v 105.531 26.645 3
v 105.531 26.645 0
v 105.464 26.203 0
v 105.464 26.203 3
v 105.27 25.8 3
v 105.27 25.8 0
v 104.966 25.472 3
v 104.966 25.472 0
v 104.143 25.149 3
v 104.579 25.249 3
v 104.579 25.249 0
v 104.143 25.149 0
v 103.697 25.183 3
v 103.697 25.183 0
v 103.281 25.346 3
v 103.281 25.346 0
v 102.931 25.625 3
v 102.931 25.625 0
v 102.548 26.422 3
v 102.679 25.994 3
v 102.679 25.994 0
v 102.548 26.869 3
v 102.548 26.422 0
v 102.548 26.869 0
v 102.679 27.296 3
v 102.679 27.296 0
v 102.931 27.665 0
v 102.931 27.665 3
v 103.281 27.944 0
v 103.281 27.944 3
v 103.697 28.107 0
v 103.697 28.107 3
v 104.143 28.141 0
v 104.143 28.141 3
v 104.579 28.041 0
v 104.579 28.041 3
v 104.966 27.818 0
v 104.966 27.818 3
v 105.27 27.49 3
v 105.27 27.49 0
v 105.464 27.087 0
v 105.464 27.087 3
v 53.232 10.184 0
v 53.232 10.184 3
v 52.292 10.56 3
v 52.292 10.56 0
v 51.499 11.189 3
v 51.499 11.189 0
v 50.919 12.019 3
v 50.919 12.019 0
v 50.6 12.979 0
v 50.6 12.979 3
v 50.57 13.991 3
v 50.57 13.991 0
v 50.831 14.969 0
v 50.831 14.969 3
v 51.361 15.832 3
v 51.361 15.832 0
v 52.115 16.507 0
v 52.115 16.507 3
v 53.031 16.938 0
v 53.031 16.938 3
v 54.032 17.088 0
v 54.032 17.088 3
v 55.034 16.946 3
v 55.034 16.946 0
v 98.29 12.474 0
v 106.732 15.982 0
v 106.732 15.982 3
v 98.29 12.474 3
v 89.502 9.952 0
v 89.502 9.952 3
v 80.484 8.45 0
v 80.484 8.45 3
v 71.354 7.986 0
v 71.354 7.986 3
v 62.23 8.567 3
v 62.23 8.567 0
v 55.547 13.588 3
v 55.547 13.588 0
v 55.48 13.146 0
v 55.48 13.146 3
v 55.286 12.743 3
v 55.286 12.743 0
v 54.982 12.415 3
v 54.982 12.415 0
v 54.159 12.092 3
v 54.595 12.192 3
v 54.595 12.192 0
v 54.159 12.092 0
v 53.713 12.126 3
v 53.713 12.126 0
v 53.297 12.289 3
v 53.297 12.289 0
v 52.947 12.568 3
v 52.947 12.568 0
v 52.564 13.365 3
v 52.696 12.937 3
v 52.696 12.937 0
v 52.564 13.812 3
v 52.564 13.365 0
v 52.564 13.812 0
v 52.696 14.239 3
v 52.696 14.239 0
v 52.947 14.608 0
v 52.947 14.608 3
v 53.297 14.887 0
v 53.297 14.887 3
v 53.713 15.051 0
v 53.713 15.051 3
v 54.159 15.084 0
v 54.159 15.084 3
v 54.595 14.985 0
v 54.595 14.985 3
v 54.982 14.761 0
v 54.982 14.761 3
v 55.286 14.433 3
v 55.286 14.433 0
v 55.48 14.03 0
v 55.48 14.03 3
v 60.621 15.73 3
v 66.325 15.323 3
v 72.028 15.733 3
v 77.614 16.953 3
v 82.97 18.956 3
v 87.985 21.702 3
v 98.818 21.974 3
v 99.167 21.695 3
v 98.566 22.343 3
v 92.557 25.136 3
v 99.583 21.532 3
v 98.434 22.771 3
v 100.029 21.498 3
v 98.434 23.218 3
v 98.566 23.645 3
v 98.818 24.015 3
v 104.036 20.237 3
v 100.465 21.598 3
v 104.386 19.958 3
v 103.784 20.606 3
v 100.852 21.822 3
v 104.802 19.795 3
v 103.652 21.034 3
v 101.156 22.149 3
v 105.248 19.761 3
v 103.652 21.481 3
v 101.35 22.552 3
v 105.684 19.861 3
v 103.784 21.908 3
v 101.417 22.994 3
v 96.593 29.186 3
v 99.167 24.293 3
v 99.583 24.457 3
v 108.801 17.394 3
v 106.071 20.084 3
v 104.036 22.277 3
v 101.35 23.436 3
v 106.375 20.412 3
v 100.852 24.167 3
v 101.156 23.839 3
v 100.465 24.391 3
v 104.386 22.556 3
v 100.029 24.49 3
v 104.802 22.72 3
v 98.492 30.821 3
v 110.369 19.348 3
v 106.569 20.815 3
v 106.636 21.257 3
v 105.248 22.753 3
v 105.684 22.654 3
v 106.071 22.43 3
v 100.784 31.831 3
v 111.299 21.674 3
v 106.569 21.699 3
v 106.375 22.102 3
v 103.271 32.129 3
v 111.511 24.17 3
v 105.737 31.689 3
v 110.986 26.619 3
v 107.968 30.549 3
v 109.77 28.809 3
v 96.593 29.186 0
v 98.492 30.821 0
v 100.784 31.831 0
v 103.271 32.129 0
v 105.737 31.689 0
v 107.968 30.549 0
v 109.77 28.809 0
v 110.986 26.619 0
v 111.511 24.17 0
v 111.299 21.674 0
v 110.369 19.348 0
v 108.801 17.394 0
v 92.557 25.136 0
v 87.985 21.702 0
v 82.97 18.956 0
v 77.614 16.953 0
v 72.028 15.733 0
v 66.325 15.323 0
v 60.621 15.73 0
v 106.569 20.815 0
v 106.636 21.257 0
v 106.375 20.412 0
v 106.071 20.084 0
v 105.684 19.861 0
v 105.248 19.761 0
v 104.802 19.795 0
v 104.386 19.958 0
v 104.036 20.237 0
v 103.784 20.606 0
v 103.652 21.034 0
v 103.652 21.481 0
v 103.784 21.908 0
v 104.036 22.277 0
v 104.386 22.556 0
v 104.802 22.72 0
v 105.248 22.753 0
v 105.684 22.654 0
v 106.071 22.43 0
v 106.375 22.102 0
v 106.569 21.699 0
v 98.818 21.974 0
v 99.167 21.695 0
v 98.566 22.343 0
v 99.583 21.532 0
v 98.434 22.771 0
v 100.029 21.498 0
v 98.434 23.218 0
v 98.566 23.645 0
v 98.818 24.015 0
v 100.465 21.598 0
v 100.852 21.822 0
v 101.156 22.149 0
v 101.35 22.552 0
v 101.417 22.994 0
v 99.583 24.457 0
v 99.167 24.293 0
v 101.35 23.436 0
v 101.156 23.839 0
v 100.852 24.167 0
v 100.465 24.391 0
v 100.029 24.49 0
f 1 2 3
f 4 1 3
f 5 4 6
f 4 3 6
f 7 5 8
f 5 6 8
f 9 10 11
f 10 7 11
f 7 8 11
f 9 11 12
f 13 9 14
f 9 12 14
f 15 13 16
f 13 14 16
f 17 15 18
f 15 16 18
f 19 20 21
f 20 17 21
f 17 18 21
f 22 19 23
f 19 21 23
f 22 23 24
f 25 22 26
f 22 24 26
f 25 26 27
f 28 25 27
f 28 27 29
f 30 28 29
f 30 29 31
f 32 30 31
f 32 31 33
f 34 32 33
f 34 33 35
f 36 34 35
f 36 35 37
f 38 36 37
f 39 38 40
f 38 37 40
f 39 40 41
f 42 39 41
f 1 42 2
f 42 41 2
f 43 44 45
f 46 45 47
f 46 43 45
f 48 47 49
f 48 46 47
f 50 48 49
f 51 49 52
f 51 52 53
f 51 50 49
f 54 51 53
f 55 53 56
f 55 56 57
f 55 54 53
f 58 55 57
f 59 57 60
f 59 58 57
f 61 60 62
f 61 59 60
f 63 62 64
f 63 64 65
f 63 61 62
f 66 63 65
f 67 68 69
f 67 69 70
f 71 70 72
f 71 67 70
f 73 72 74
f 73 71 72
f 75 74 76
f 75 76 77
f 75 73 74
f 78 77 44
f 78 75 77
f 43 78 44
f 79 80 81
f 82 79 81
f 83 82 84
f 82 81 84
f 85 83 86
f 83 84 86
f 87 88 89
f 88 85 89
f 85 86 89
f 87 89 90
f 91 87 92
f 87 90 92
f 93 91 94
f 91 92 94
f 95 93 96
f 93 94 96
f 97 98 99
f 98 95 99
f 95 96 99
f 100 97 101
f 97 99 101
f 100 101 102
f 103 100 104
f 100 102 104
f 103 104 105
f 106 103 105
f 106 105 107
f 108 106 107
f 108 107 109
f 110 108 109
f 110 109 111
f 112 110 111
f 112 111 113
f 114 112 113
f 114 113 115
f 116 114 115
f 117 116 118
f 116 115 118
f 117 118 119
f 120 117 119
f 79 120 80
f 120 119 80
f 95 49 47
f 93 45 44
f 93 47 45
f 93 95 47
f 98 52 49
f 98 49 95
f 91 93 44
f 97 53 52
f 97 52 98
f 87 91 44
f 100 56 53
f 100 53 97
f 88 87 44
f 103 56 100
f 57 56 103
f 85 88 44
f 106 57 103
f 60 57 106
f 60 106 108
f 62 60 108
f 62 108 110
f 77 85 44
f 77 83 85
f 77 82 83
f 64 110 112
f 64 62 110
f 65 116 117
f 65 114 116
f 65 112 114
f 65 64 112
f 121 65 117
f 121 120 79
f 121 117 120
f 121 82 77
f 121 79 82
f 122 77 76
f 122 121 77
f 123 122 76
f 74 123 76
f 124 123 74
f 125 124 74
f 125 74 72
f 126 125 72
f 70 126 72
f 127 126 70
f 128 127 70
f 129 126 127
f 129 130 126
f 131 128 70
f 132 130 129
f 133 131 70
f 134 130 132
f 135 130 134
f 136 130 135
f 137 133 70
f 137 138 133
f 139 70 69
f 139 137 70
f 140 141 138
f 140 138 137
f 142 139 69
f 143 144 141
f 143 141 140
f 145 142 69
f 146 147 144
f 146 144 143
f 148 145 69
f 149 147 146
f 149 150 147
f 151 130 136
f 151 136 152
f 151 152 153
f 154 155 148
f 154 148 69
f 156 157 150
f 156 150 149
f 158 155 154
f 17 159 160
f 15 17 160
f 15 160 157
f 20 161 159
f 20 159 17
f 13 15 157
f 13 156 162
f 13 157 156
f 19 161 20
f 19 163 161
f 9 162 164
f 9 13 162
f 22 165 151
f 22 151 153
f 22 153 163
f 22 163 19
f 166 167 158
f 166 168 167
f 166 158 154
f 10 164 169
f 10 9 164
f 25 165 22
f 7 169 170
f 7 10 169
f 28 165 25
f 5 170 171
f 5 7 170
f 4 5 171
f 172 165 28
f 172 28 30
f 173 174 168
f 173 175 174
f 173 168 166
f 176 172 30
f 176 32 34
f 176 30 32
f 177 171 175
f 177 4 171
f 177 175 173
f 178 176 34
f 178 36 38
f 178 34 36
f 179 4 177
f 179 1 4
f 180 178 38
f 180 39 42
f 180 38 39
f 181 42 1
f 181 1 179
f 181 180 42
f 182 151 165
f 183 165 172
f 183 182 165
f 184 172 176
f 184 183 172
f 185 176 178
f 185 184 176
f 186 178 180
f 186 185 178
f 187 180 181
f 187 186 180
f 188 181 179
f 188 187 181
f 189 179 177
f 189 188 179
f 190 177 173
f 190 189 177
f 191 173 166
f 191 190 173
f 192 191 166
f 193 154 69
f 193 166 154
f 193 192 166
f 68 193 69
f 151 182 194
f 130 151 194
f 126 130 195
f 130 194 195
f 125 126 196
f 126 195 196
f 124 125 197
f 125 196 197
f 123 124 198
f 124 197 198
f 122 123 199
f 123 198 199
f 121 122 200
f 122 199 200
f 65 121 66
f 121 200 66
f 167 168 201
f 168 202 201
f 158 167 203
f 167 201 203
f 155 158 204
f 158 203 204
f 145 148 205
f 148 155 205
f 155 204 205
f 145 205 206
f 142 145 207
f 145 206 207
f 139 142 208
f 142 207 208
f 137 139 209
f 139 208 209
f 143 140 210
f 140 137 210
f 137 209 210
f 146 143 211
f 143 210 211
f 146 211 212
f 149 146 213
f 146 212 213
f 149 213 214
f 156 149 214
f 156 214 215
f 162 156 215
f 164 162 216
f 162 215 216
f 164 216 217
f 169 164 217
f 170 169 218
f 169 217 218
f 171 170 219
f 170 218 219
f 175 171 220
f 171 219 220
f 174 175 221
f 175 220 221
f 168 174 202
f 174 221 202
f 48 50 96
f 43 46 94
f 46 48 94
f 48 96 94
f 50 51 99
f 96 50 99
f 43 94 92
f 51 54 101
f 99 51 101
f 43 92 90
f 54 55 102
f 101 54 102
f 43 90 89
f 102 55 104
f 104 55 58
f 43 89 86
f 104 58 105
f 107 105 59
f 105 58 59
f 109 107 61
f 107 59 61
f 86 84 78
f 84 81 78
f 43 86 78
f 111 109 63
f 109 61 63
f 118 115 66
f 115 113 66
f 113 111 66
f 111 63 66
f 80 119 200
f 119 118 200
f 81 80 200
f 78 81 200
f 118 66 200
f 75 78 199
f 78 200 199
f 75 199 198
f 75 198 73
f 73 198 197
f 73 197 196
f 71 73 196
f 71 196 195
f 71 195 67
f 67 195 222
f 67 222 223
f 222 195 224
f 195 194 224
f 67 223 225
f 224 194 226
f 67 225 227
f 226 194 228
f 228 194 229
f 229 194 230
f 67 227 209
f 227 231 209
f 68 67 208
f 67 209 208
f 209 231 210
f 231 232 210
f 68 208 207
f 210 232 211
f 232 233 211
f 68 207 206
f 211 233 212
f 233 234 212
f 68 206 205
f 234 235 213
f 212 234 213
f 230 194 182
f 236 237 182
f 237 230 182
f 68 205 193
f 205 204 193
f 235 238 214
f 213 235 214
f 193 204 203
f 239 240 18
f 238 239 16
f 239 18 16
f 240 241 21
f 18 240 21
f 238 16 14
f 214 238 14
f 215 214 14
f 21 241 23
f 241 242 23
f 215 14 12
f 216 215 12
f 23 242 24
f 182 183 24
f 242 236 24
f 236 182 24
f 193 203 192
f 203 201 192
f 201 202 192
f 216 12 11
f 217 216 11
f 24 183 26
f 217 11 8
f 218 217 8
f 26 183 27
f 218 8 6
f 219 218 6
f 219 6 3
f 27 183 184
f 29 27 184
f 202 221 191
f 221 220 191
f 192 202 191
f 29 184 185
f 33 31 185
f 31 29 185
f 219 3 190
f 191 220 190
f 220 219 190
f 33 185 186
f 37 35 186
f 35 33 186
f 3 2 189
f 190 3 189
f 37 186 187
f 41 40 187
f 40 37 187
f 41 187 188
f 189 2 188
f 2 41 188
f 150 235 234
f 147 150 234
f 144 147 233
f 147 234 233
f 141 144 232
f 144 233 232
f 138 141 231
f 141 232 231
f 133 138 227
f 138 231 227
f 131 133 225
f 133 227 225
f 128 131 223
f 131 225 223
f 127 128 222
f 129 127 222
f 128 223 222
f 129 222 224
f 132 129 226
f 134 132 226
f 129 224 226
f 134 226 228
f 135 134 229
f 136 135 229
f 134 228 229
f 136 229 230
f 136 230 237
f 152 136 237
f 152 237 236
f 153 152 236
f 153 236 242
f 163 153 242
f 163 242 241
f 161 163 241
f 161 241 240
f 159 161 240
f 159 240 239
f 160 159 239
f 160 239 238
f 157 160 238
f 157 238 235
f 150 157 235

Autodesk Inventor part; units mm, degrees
ref_plane "YZ Plane" through (0, 0, 0) normal (1, 0, 0) x (0, 1, 0)
ref_plane "XZ Plane" through (0, 0, 0) normal (0, 1, 0) x (-1, 0, 0)
ref_plane "XY Plane" through (0, 0, 0) normal (0, 0, 1) x (1, 0, 0)
sketch "スケッチ1" plane through (0, 0, 0) normal (0, 0, 1) x (1, 0, 0)
  line L0 (-170.6512, -31.4118) -> (202.8656, -31.4118) construction
  circle A0 centre (-14, -17.4118) radius 14 construction
  circle A1 centre (14, -17.4118) radius 14 construction
  circle A2 centre (-28.0204, 0.0121) radius 20.05 construction
  circle A3 centre (-28.0204, 0.0121) radius 5.05 construction
  circle A4 centre (8.8763, 3.8907) radius 32.05 construction
  circle A5 centre (8.8763, 3.8907) radius 10.1 construction
  circle A6 centre (54.047, 13.5882) radius 36.1 construction
  line L1 (-170.915, -81.4118) -> (490.0044, -81.4118)
  circle A7 centre (-28.0204, 0.0121) radius 22.342 construction
  circle A8 centre (-39.4931, 19.1835) radius 14 construction
  circle A9 centre (-49.0547, 7.5438) radius 14 construction
  circle A10 centre (-49.0547, -7.5196) radius 14 construction
  circle A11 centre (-39.4931, -19.1593) radius 14 construction
  circle A12 centre (8.8763, 3.8907) radius 33.05 construction
  circle A13 centre (54.047, 13.5882) radius 38.1 construction
  line L2 (-11.5565, -29.1593) -> (4.2969, -29.1593) construction
  line L3 (-67.2952, 44.8622) -> (-67.2952, -57.3934) construction
  line L4 (-149.4523, -1.6098) -> (-132.6633, -31.6026)
  line L5 (-132.7701, -31.4118) -> (-132.7701, 74.0456)
  circle A14 centre (-11.4931, -19.1593) radius 14 construction
  line L6 (-197.2268, -33.1593) -> (179.6604, -33.1593) construction
  circle A15 centre (54.047, 13.5882) radius 4.025
  circle A16 centre (54.047, 13.5882) radius 6
  circle A17 centre (-39.4931, 19.1835) radius 5
  circle A18 centre (-49.0547, 7.5438) radius 5
  circle A19 centre (-49.0547, -7.5196) radius 5
  circle A20 centre (-39.4931, -19.1593) radius 5
  circle A21 centre (-39.4931, 19.1835) radius 8 construction
  circle A22 centre (-49.0547, 7.5438) radius 8 construction
  circle A23 centre (-49.0547, -7.5196) radius 8 construction
  circle A24 centre (-39.4931, -19.1593) radius 8 construction
  circle A25 centre (-28.0204, 0.0121) radius 4.5
  circle A26 centre (8.8763, 3.8907) radius 7.5
  line L7 (-17.5497, 32.3149) -> (-46.3578, 15.0755) construction
  line L8 (-46.3578, 15.0755) -> (-51.7515, 0.0121) construction
  line L9 (-51.7515, 0.0121) -> (-46.3578, -15.0513) construction
  line L10 (-46.3578, -15.0513) -> (-37.9391, -20.0892) construction
  circle A27 centre (-32.6283, 23.2915) radius 1.3
  circle A28 centre (-46.3578, 15.0755) radius 1.3
  circle A29 centre (-51.7515, 0.0121) radius 1.3
  circle A30 centre (-46.3578, -15.0513) radius 1.3
  circle A31 centre (-32.6283, -23.2673) radius 1.3
  line L11 (-67.2952, 23.1796) -> (-67.2952, -18.1327)
  arc A32 (79.2003, -37.212) -> (87.3507, -31.2711) centre (80.4159, -30.3183) ccw
  arc A33 (8.1864, 50.8943) -> (0.9804, 51.9708) centre (3.7003, 45.5208) ccw
  line L12 (-52.2685, -33.1593) -> (56.2168, -33.1593)
  line L13 (56.2168, -33.1593) -> (79.2003, -37.212)
  arc A34 (92.7831, 8.2659) -> (29.742, 44.2162) centre (54.047, 13.5882) ccw
  line L14 (87.3507, -31.2711) -> (92.7831, 8.2659)
  line L15 (0.9804, 51.9708) -> (-67.2952, 23.1796)
  circle A35 centre (34.0114, -24.0061) radius 4.5 construction
  circle A36 centre (34.0114, -24.0061) radius 1.5
  circle A37 centre (-21.4477, 26.0369) radius 4.5 construction
  circle A38 centre (-21.4477, 26.0369) radius 1.5
  circle A39 centre (-56.0504, 23.0377) radius 1.5
  circle A40 centre (-56.0504, 23.0377) radius 3 construction
  circle A41 centre (-56.0504, 23.0377) radius 4.5 construction
  circle A42 centre (-64.2952, 0.0121) radius 1.5
  circle A43 centre (-64.2952, 0.0121) radius 3 construction
  circle A44 centre (-64.2952, 0.0121) radius 4.3311 construction
  line L16 (54.047, 13.5882) -> (103.0278, 23.6322)
  line L17 (103.0278, 23.6322) -> (59.4403, 12.4461)
  line L18 (59.4403, 12.4461) -> (30.7326, 32.4678)
  line L19 (30.7326, 32.4678) -> (54.047, 13.5882)
  line L20 (103.0278, 23.6322) -> (519.5307, 130.5215)
  line L21 (-183.2789, 162.2213) -> (-183.2789, -125.2315)
  line L22 (516.7211, 155.5913) -> (516.7211, -155.5644)
  circle A45 centre (103.0278, 23.6322) radius 7.25
  arc A46 (101.805, 33.809) -> (106.8568, 14.1242) centre (103.0278, 23.6322) ccw
  line L23 (141.7723, 33.5754) -> (440.8907, 56.5571) construction
  line L24 (241.9124, 41.2693) -> (202.3713, 99.0317) construction
  circle A47 centre (3.7003, 45.5208) radius 4
  circle A48 centre (127.2431, 29.8467) radius 2
  circle A49 centre (141.7723, 33.5754) radius 2
  arc A50 (143.6401, 28.9373) -> (141.1758, 38.5397) centre (141.7723, 33.5754) ccw
  line L25 (143.6401, 28.9373) -> (106.8568, 14.1242)
  line L26 (141.1758, 38.5397) -> (101.805, 33.809)
  circle A51 centre (30.7326, 32.4678) radius 2
  circle A52 centre (-16.1798, -24.0771) radius 4.5 construction
  circle A53 centre (-16.1798, -24.0771) radius 1.5
  line L27 (-67.2952, -18.1327) -> (-52.2685, -33.1593)
  circle A54 centre (-56.0504, -23.0135) radius 1.5
  circle A55 centre (-56.0504, -23.0135) radius 3 construction
  circle A56 centre (30.7326, 32.4678) radius 4
  arc A57 (55.034, 16.9462) -> (53.2318, 10.1845) centre (54.047, 13.5882) ccw
  line L28 (99.9171, 22.9943) -> (104.0308, 26.6451) construction
  line L29 (104.0308, 26.6451) -> (105.1356, 21.2572) construction
  line L30 (105.1356, 21.2572) -> (99.9171, 22.9943) construction
  circle A58 centre (105.1356, 21.2572) radius 1.5
  circle A59 centre (104.0308, 26.6451) radius 1.5
  circle A60 centre (99.9171, 22.9943) radius 1.5
  circle A61 centre (103.0278, 23.6322) radius 6
  arc A62 (106.7324, 15.9819) -> (96.5933, 29.1862) centre (103.0278, 23.6322) ccw
  arc A63 (55.034, 16.9462) -> (96.5933, 29.1862) centre (66.3134, 55.3229) ccw
  arc A64 (53.2318, 10.1845) -> (106.7324, 15.9819) centre (71.8656, 87.9841) ccw
  circle A65 centre (54.047, 13.5882) radius 8.5
  line L31 (101.3203, 31.9589) -> (52.3395, 21.9149)
  line L32 (55.7545, 5.2615) -> (104.7353, 15.3054)
  circle A66 centre (12.7384, 41.2415) radius 3 construction
  circle A67 centre (12.7384, 41.2415) radius 4.5 construction
  circle A68 centre (12.7384, 41.2415) radius 1.5
  circle A69 centre (80.4159, -30.3183) radius 4
  circle A70 centre (69.7531, -26.0108) radius 1.5
  circle A71 centre (69.7531, -26.0108) radius 4.5 construction
  circle A72 centre (-56.0504, -23.0135) radius 4.5 construction
  line L33 (8.1864, 50.8943) -> (15.9809, 44.3871)
  arc A73 (15.9809, 44.3871) -> (29.742, 44.2162) centre (22.9664, 52.7545) ccw
  circle A74 centre (-5.4761, 38.5895) radius 1.5
  circle A75 centre (-5.4761, 38.5895) radius 4.5 construction
  circle A76 centre (54.047, 13.5882) radius 50 construction
  circle A77 centre (3.7003, 45.5208) radius 2
  circle A78 centre (80.4159, -30.3183) radius 2
  circle A79 centre (54.047, 13.5882) radius 1.5
  point P0 (0, 0)
  point P1 (0, 0)
  point P2 (-49.0547, 7.5438)
  point P3 (-49.0547, -7.5196)
  dimension "d89" = 100
  dimension "d0" = 40.1
  dimension "d1" = 10.1
  dimension "d2" = 64.1
  dimension "d3" = 20.2
  dimension "d4" = 72.2
  dimension "d5" = 95
  dimension "d6" = 44.684
  dimension "d7" = 28
  dimension "d8" = 28
  dimension "d9" = 28
  dimension "d10" = 28
  dimension "d11" = 1
  dimension "d12" = 2
  dimension "d13" = 4
  dimension "d14" = 8.05
  dimension "d15" = 12
  dimension "d16" = 10
  dimension "d17" = 10
  dimension "d18" = 10
  dimension "d19" = 10
  dimension "d20" = 3
  dimension "d21" = 3
  dimension "d22" = 3
  dimension "d23" = 3
  dimension "d24" = 9
  dimension "d25" = 15
  dimension "d26" = 2.6
  dimension "d27" = 2.6
  dimension "d28" = 2.6
  dimension "d29" = 2.6
  dimension "d30" = 2.6
  dimension "d31" = 1
  dimension "d32" = 9
  dimension "d33" = 3
  dimension "d34" = 9
  dimension "d35" = 3
  dimension "d36" = 3
  dimension "d37" = 6
  dimension "d38" = 9
  dimension "d39" = 3
  dimension "d40" = 6
  dimension "d41" = 50
  dimension "d42" = 45
  dimension "d43" = 35
  dimension "d44" = 30
  dimension "d45" = 39
  dimension "d46" = 430
  dimension "d47" = 700
  dimension "d48" = 14.5
  dimension "d49" = 3
  dimension "d50" = 300
  dimension "d51" = 10
  dimension "d52" = 70
  dimension "d53" = 120
  dimension "d54" = 140
  dimension "d55" = 8
  dimension "d56" = 4
  dimension "d57" = 4
  dimension "d58" = 15
  dimension "d59" = 25
  dimension "d60" = 10
  dimension "d61" = 4
  dimension "d62" = 9
  dimension "d63" = 3
extrude "押し出し1" add sketch "スケッチ1" along normal blind 3 contours A15 L18 L16 | A15 L16 A16 L17 L18 | L16 L18 A57 A63 A15 | A15 A63 A16 L16 | L18 L17 A16 A64 A15 | A15 A64 A57 L19 A79 L16 L18 | L16 A79 L19 A57 L18 | L16 A65 L17 A16 | A16 A63 A65 L16 | A65 A63 L16 | L16 A63 L17 A65 | A16 L17 A65 A64 | A65 L17 A63 A34 L32 A64 | A63 A34 L16 | L16 A34 L17 A63 | L32 A34 A64 | L16 A46 L17 A34 | A34 A63 A46 L16 | A34 L32 A46 A64 | A34 L17 A46 L32 | A46 A63 A62 L20 A45 L16 | L16 A45 L17 A46 | A46 L17 A45 L20 A62 A64 | A45 L20 A61 L16 | L16 A61 L17 A45 | L17 A61 L20 A45 | A61 L20 L16 A60 | L16 A60 L17 A61 | L17 A60 L20 A61 | L16 L17 A60 picked at (101.9354, 23.3989)
properties part number "アーム駆動抑え" material "アルミニウム 2014-T4"
